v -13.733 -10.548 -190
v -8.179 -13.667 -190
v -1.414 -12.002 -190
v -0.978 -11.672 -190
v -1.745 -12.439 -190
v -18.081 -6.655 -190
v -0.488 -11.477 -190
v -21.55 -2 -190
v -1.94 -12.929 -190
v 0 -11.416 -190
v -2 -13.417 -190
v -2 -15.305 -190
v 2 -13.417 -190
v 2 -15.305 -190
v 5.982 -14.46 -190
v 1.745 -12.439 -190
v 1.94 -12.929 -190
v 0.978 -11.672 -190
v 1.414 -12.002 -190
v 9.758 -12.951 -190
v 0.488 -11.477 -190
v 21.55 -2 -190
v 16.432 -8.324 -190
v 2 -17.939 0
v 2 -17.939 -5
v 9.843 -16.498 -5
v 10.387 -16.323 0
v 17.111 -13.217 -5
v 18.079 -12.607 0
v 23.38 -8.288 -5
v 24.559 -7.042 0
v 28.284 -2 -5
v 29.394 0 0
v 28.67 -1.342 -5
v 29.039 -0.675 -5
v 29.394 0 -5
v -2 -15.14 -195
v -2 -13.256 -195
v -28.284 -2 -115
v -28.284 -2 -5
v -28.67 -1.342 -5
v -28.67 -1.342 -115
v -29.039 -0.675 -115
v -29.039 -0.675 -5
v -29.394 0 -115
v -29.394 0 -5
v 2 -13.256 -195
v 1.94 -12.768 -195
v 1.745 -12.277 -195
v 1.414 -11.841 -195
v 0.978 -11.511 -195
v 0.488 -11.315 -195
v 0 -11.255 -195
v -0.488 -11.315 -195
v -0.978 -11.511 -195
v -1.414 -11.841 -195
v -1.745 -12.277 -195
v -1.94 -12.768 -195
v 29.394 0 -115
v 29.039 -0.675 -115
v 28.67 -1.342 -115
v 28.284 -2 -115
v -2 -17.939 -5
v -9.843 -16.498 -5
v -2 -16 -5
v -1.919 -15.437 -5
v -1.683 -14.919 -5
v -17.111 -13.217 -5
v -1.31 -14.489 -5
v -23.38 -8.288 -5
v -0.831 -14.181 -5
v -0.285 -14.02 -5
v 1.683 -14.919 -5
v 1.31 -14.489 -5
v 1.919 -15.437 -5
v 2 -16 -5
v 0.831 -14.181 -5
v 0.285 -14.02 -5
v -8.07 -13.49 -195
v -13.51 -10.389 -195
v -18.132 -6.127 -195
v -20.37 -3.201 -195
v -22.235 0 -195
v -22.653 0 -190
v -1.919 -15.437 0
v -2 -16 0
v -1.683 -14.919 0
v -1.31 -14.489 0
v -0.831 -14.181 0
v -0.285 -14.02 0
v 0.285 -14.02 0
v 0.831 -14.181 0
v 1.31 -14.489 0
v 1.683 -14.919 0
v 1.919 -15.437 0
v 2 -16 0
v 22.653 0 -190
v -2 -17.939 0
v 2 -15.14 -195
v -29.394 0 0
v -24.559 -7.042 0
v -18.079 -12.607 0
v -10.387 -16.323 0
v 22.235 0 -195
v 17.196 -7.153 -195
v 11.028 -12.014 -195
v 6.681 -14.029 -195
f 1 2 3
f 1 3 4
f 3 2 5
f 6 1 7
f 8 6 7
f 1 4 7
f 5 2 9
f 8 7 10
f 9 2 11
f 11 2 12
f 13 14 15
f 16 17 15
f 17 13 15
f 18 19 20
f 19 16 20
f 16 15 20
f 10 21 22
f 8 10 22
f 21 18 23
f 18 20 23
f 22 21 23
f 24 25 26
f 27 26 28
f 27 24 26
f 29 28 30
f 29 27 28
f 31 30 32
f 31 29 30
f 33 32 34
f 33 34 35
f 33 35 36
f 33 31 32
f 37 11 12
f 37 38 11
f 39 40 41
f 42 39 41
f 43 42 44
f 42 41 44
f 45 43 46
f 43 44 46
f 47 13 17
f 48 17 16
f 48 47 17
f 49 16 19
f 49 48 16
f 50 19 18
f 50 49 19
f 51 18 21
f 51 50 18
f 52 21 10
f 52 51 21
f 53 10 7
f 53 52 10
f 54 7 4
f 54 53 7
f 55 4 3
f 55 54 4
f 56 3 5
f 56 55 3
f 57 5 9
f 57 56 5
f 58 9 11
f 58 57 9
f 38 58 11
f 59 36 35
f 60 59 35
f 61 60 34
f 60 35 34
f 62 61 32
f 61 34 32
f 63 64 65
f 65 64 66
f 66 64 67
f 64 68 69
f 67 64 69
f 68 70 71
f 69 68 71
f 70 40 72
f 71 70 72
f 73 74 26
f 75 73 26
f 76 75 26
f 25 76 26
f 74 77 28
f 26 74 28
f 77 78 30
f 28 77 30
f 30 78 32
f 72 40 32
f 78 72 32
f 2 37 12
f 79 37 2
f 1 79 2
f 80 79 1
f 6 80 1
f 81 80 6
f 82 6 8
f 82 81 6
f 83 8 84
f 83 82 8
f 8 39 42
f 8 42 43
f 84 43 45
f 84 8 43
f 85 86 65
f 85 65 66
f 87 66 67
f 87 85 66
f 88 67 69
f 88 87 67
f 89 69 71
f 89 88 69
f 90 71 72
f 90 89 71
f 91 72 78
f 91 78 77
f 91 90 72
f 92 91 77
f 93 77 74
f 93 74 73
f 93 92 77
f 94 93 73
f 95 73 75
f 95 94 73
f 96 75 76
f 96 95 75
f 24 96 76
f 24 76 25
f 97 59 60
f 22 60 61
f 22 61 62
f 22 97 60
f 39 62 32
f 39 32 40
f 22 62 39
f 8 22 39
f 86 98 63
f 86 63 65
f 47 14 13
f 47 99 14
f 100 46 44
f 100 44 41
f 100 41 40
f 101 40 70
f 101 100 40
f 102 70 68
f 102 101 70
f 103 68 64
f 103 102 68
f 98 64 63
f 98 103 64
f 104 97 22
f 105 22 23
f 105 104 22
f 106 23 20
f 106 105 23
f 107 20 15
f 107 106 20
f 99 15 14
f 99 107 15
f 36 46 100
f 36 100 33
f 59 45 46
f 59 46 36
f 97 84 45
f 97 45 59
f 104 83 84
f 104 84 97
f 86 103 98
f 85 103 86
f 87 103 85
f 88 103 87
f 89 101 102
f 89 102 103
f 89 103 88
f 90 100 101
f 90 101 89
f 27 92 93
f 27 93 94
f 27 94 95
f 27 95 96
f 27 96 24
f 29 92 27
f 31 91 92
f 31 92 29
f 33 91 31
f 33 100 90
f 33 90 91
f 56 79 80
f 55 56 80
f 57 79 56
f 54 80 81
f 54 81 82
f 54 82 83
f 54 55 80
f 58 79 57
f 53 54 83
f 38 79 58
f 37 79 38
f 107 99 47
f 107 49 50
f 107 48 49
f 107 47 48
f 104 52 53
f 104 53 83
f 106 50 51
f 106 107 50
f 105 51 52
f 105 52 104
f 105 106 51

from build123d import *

# Parameters (mm, degrees)
BOSS_EXTRUDE1_DEPTH = 5
BOSS_EXTRUDE2_DEPTH = 110


with BuildPart() as part:
    # Sketch1 → Boss-Extrude1 (new body)
    with BuildSketch(Plane.XY):
        with BuildLine():
            Line((29.393876913, 0), (-29.393876913, 0))
            ThreePointArc((-29.393876913, 0), (-18.078961268, -12.607085313), (-2, -17.939338184))
            Line((-2, -17.939338184), (-2, -16))
            ThreePointArc((-2, -16), (0, -14), (2, -16))
            Line((2, -16), (2, -17.939338184))
            ThreePointArc((2, -17.939338184), (18.078961268, -12.607085313), (29.393876913, 0))
        make_face()
    extrude(amount=-BOSS_EXTRUDE1_DEPTH)

    # Sketch4 → Boss-Extrude2 (add)
    with BuildSketch(Plane(origin=(0, 0, -5), x_dir=(-1, 0, 0), z_dir=(0, 0, -1))):
        with BuildLine():
            Line((-28.284271247, -2), (28.284271247, -2))
            ThreePointArc((28.284271247, -2), (28.856406461, -1.009616054), (29.393876913, 0))
            Line((29.393876913, 0), (-29.393876913, 0))
            ThreePointArc((-29.393876913, 0), (-28.856406461, -1.009616054), (-28.284271247, -2))
        make_face()
    extrude(amount=BOSS_EXTRUDE2_DEPTH)



with BuildPart() as body_2:
    # Sketch12 → Loft4 section 0
    with BuildSketch(Plane(origin=(0, 0, -190), x_dir=(-1, 0, 0), z_dir=(0, 0, -1))):
        with BuildLine():
            Line((22.653180887, 0), (-22.653180887, 0))
            add(Edge.make_bspline(
                [(-22.653180887, 0), (-22.148977198, -1.002294604), (-21.312728642, -2.455970505), (-20.356311796, -3.834839427), (-19.691645963, -4.737243386), (-19.346258554, -5.179245011), (-17.567122979, -7.32705895), (-15.968170417, -8.864263), (-13.740314516, -10.549553496), (-13.281768803, -10.87542484), (-12.351437875, -11.495278896), (-11.878861514, -11.790005264), (-10.438884851, -12.628551852), (-9.449353735, -13.126979054), (-7.918655947, -13.779445474), (-7.400698933, -13.981090551), (-6.348352712, -14.35067626), (-5.811978486, -14.519061657), (-4.190297425, -14.964979291), (-3.100362704, -15.18241512), (-1.999999905, -15.305387205)],
                knots=[0, 0, 0, 0, 0.125, 0.1875, 0.1875, 0.25, 0.25, 0.5, 0.5, 0.5625, 0.5625, 0.625, 0.625, 0.75, 0.75, 0.8125, 0.8125, 0.875, 0.875, 1, 1, 1, 1], degree=3))
            Line((-1.999999905, -15.305387205), (-1.999999905, -13.417274226))
            add(Edge.make_bspline(
                [(2.000000095, -13.417274226), (2.000000095, -11.416233914), (9.5e-08, -11.416233914), (-1.999999905, -11.416233914), (-1.999999905, -13.417274226)],
                knots=[4.71238898, 4.71238898, 4.71238898, 6.283185307, 6.283185307, 7.853981634, 7.853981634, 7.853981634], degree=2, weights=[1, 0.707106781, 1, 0.707106781, 1]))
            Line((2.000000095, -13.417274226), (2.000000095, -15.30538728))
            add(Edge.make_bspline(
                [(2.000000095, -15.30538728), (3.11768943, -15.180478923), (4.210798102, -14.960003678), (6.358212923, -14.368193301), (7.413433781, -13.99578054), (9.48316466, -13.111567426), (10.477319809, -12.608065076), (12.391619169, -11.489443387), (13.311776359, -10.874343619), (15.080037554, -9.535479611), (15.928293309, -8.811314066), (17.550364646, -7.253254035), (18.308014434, -6.434881586), (20.428872732, -3.867681555), (21.642679013, -2.008752815), (22.653180887, 0)],
                knots=[0, 0, 0, 0, 0.125, 0.125, 0.25, 0.25, 0.375, 0.375, 0.5, 0.5, 0.625, 0.625, 0.75, 0.75, 1, 1, 1, 1], degree=3))
        make_face()
    # Sketch13 → Loft4 section 1
    with BuildSketch(Plane(origin=(0, 0, -195), x_dir=(-1, 0, 0), z_dir=(0, 0, -1))):
        with BuildLine():
            Line((22.23493812, 0), (-22.23493812, 0))
            add(Edge.make_bspline(
                [(-22.23493812, 0), (-21.740282728, -0.98514663), (-20.92074495, -2.414398694), (-19.984690863, -3.770833773), (-19.334428952, -4.658733952), (-18.995985903, -5.094588627), (-17.253288329, -7.212565885), (-15.688377335, -8.729957297), (-13.509914793, -10.396251463), (-13.061466045, -10.718755366), (-12.149963097, -11.333679684), (-11.686964176, -11.626255977), (-10.276201265, -12.459278365), (-9.306792445, -12.955267146), (-7.807228346, -13.605896686), (-7.299808046, -13.807233863), (-6.268850056, -14.176803971), (-5.743994744, -14.345317324), (-4.151377213, -14.793942329), (-3.080899423, -15.013927219), (-2.0000001, -15.139517415)],
                knots=[0, 0, 0, 0, 0.125, 0.1875, 0.1875, 0.25, 0.25, 0.5, 0.5, 0.5625, 0.5625, 0.625, 0.625, 0.75, 0.75, 0.8125, 0.8125, 0.875, 0.875, 1, 1, 1, 1], degree=3))
            Line((-2.0000001, -15.139517415), (-2.0000001, -13.255983903))
            add(Edge.make_bspline(
                [(1.9999999, -13.255983903), (1.9999999, -11.254943591), (-1e-07, -11.254943591), (-2.0000001, -11.254943591), (-2.0000001, -13.255983903)],
                knots=[1.570796327, 1.570796327, 1.570796327, 3.141592654, 3.141592654, 4.71238898, 4.71238898, 4.71238898], degree=2, weights=[1, 0.707106781, 1, 0.707106781, 1]))
            Line((1.9999999, -13.255983903), (1.9999999, -15.139517335))
            add(Edge.make_bspline(
                [(1.9999999, -15.139517335), (3.097475762, -15.012001028), (4.170492913, -14.789132022), (5.751323617, -14.342960473), (6.273417873, -14.175331497), (7.308353862, -13.804002428), (7.822701798, -13.599731703), (9.341618745, -12.939021482), (10.314473073, -12.438519778), (12.187983442, -11.328505685), (13.088646639, -10.719004096), (14.819688416, -9.393879642), (15.651226146, -8.676872801), (17.2374738, -7.139809792), (17.978680245, -6.333075632), (20.054337825, -3.803997633), (21.243421171, -1.974687006), (22.23493812, 0)],
                knots=[0, 0, 0, 0, 0.125, 0.125, 0.1875, 0.1875, 0.25, 0.25, 0.375, 0.375, 0.5, 0.5, 0.625, 0.625, 0.75, 0.75, 1, 1, 1, 1], degree=3))
        make_face()
    loft()


with BuildPart() as part_1:
    add(part.part)

    add(body_2.part)  # Loft5 merges body 2
    # Sketch15 for Loft5 → Loft5 section 0
    with BuildSketch(Plane(origin=(0, 0, -115), x_dir=(-1, 0, 0), z_dir=(0, 0, -1))):
        with BuildLine():
            Line((-28.284271247, -2), (28.284271247, -2))
            # circular arc as an exact rational Bezier (weights 1, cos(half-angle), 1)
            Bezier((28.284271247, -2), (28.873749257, -1.019237886), (29.393876913, 0), weights=[1, 0.999399358, 1])
            Line((29.393876913, 0), (-29.393876913, 0))
            Bezier((-29.393876913, 0), (-28.873749257, -1.019237886), (-28.284271247, -2), weights=[1, 0.999399358, 1])
        make_face()
    # Sketch14 → Loft5 section 1
    with BuildSketch(Plane.XY.offset(-190)):
        with BuildLine():
            Line((-21.55031948, -2), (21.549816234, -2))
            add(Edge.make_bspline(
                [(21.549816234, -2), (21.942306372, -1.348710735), (22.310082744, -0.682036694), (22.653180887, 0)],
                knots=[0.914940591, 0.914940591, 0.914940591, 0.914940591, 1, 1, 1, 1], degree=3))
            Line((22.653180887, 0), (-22.653180887, 0))
            add(Edge.make_bspline(
                [(-22.653180887, 0), (-22.309091279, -0.684007607), (-21.941428628, -1.350643187), (-21.55031948, -2)],
                knots=[0, 0, 0, 0, 0.085128394, 0.085128394, 0.085128394, 0.085128394], degree=3))
        make_face()
    loft()


solid = part_1.part
